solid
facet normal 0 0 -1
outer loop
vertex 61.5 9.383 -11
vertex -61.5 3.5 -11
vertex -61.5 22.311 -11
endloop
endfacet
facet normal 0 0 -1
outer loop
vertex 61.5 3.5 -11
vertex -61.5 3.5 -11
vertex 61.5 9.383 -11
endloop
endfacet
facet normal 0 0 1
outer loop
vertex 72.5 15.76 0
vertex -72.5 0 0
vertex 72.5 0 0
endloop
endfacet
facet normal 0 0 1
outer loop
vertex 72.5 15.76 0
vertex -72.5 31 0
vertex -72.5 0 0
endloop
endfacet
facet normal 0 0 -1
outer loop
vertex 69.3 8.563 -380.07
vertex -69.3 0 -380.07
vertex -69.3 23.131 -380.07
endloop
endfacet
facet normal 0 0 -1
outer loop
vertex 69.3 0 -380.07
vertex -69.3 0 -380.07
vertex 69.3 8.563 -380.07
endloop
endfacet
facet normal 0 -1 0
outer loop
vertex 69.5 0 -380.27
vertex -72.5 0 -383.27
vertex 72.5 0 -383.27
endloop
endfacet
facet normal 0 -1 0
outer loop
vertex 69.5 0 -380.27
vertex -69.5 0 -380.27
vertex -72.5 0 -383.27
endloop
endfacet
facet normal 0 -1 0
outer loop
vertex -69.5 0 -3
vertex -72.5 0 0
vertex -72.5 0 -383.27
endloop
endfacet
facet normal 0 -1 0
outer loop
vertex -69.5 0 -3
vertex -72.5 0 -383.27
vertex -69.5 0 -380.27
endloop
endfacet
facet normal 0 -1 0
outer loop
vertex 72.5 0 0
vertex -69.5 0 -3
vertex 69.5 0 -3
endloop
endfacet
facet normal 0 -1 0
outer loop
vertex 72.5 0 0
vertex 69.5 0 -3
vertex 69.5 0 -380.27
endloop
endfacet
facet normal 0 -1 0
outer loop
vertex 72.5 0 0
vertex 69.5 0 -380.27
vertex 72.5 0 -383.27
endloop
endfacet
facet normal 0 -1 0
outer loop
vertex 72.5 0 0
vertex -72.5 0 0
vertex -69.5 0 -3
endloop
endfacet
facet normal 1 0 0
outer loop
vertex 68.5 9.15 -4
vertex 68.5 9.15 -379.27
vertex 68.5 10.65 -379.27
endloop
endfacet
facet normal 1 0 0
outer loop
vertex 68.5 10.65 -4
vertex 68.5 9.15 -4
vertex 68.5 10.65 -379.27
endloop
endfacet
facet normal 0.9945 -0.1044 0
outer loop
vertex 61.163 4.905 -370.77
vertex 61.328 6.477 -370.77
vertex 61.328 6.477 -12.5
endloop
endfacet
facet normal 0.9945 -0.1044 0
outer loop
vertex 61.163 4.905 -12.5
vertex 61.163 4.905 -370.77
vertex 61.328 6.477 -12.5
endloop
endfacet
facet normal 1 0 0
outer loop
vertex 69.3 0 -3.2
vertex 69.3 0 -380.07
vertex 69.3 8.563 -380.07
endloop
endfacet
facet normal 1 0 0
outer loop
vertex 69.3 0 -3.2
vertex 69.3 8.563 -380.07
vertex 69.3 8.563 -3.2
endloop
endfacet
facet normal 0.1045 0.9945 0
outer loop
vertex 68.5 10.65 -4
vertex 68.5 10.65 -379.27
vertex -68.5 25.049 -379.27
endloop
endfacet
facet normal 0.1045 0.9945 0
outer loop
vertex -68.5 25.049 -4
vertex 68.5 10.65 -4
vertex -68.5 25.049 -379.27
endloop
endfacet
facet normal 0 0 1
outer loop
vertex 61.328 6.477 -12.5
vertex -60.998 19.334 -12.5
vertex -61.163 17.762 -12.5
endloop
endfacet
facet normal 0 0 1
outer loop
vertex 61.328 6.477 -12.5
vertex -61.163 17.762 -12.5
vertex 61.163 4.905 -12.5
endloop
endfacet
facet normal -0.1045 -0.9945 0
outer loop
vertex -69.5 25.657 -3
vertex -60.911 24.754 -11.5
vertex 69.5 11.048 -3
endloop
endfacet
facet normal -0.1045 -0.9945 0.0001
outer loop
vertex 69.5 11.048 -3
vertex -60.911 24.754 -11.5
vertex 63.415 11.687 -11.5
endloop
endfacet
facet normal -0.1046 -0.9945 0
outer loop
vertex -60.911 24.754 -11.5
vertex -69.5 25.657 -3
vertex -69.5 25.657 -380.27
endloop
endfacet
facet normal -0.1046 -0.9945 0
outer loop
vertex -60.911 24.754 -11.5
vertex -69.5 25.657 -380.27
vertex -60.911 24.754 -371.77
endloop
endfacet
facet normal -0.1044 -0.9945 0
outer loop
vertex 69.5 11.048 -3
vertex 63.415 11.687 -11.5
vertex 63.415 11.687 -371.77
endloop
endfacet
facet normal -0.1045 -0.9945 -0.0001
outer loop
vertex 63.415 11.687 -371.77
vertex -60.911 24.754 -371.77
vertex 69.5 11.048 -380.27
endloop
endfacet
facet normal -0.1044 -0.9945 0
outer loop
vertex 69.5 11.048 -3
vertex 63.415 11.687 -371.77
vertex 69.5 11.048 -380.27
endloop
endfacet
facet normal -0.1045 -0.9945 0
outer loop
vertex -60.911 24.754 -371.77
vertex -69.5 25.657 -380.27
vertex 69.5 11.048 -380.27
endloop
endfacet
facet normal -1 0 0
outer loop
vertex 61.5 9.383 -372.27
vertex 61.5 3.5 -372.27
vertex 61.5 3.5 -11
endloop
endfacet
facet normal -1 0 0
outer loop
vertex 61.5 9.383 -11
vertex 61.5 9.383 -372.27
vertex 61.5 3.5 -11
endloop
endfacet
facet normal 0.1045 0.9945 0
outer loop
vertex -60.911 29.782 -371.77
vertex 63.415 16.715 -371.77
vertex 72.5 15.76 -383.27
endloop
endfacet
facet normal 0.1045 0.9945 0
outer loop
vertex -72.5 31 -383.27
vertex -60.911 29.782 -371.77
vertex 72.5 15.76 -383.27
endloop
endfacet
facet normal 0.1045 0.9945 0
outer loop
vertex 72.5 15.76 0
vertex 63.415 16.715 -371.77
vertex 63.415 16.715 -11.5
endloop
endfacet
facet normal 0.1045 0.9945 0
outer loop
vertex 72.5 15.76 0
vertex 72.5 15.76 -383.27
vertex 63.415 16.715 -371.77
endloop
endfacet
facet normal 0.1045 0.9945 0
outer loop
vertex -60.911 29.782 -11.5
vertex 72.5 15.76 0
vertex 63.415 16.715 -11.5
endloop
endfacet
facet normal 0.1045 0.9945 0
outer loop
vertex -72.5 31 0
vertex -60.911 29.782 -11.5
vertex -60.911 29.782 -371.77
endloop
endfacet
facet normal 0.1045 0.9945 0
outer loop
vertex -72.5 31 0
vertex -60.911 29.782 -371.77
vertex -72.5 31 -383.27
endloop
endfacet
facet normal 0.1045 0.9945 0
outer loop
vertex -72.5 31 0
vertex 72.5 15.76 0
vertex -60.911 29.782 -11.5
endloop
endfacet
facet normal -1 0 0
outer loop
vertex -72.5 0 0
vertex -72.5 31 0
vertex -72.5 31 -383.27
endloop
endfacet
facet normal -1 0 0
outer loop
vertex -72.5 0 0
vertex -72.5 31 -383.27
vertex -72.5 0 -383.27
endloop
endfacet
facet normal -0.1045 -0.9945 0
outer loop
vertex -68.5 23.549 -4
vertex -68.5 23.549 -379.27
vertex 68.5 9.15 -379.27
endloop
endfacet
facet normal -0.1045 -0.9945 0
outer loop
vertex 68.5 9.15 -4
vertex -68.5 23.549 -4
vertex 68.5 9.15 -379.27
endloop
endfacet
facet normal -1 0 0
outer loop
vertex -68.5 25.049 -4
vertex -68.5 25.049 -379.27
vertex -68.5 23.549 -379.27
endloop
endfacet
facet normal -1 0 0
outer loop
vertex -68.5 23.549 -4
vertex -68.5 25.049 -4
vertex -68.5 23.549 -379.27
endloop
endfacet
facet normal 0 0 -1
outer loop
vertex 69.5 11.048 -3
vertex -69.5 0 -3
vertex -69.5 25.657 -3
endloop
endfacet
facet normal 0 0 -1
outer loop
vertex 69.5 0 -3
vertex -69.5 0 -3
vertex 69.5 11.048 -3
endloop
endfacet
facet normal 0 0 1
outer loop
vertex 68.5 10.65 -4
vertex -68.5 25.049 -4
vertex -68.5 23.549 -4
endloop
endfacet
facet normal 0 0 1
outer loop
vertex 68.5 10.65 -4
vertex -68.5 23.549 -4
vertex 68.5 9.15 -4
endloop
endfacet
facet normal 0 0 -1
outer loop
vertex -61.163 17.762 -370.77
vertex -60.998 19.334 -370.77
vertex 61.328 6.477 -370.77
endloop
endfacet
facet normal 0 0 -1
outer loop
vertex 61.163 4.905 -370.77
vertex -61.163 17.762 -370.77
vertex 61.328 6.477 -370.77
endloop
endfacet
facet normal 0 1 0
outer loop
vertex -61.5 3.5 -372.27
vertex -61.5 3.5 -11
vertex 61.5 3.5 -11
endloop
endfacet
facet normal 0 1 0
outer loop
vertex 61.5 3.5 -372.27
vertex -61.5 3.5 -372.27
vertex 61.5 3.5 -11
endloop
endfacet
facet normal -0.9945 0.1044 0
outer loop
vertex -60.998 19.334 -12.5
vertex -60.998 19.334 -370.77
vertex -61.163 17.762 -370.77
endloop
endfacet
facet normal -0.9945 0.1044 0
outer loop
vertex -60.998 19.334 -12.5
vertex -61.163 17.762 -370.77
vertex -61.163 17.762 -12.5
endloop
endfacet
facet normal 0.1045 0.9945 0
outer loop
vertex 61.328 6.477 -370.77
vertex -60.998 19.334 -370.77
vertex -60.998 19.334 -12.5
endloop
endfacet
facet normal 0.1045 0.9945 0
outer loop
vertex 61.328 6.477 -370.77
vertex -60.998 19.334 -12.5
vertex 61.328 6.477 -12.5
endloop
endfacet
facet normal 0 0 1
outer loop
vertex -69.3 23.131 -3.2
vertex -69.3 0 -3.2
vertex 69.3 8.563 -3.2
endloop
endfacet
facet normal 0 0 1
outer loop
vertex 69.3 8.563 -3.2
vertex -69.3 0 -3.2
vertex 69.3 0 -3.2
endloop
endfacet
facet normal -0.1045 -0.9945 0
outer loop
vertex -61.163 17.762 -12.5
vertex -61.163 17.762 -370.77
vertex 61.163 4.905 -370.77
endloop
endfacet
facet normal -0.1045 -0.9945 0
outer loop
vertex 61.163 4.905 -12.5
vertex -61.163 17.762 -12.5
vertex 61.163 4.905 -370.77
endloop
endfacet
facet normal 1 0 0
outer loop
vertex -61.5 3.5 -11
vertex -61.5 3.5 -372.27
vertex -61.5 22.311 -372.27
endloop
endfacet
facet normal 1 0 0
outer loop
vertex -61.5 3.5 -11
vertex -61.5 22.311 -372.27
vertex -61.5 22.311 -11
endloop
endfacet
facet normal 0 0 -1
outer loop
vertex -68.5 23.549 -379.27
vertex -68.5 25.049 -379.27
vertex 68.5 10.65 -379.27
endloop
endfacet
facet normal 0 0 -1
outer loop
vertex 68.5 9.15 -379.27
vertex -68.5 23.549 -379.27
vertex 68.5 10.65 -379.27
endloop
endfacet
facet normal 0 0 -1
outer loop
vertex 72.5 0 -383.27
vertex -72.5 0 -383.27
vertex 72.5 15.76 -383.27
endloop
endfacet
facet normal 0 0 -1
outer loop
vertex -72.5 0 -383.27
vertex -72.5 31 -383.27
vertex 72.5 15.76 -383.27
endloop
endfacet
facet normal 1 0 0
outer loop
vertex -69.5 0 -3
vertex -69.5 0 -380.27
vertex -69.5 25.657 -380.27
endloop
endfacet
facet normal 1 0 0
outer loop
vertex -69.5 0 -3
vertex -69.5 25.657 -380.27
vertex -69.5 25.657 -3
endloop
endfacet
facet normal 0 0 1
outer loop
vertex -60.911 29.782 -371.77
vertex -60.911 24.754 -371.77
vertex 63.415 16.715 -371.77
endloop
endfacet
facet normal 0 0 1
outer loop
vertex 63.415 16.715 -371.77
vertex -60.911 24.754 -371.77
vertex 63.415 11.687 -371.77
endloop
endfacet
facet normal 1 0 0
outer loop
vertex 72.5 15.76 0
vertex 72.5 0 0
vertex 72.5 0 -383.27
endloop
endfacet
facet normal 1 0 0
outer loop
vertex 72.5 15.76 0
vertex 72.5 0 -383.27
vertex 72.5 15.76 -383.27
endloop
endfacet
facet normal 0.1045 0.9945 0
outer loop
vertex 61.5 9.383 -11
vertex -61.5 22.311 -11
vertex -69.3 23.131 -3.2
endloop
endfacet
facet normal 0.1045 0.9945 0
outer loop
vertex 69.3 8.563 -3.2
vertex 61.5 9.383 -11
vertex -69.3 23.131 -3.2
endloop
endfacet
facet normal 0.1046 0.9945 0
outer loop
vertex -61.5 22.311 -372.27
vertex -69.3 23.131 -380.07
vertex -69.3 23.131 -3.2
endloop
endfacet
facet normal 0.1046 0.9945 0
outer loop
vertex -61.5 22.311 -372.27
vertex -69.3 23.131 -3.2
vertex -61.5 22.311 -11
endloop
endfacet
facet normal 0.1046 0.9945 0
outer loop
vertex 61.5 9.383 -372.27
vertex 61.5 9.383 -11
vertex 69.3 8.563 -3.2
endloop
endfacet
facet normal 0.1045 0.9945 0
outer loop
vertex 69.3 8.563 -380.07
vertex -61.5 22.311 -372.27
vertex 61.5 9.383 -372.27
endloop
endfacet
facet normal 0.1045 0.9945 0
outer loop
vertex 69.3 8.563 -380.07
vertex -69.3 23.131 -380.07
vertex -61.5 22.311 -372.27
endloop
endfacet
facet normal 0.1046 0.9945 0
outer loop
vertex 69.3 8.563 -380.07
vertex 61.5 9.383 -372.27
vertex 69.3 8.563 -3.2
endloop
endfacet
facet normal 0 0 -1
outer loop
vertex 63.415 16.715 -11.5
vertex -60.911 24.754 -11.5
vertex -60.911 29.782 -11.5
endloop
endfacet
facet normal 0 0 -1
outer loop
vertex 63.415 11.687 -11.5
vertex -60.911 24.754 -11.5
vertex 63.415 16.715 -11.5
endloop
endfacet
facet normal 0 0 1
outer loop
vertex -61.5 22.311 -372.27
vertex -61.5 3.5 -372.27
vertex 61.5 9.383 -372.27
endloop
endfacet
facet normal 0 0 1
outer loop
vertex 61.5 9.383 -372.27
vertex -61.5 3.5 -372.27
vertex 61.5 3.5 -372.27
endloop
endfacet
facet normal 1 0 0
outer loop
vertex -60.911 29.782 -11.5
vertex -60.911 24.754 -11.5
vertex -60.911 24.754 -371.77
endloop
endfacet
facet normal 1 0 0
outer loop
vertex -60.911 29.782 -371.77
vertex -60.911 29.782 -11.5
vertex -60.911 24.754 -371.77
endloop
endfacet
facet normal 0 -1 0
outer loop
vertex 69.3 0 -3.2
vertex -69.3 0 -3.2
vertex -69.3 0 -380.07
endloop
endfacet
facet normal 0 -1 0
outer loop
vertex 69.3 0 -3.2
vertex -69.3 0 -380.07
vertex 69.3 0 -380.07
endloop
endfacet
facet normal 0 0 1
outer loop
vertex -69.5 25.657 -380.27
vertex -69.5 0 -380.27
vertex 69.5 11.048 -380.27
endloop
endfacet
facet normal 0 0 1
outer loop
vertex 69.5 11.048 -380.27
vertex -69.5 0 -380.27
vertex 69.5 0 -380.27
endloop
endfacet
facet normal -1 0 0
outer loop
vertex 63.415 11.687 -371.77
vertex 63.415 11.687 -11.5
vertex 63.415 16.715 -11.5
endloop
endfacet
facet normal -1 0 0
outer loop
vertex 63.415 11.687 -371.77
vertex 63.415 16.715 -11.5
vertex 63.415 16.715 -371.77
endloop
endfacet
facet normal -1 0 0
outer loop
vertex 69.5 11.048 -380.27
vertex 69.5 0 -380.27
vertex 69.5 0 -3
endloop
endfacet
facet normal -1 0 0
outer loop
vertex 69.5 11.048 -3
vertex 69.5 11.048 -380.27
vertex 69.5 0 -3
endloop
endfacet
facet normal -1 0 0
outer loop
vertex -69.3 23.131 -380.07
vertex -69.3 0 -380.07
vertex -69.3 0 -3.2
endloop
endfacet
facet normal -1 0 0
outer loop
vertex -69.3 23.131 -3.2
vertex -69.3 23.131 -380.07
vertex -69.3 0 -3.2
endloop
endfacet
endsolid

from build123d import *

# Parameters (mm, degrees)
TOP_CASE_MAIN_DEPTH         = 383.27
TOP_CASE_CUT_REACH          = 393.297
SKETCH17_W                  = 139
SKETCH17_H                  = 377.27
TOP_PLATE_AND_RETENTION_W   = 124.32619313
TOP_PLATE_AND_RETENTION_H   = 360.27
TOP_CASE_CUT_EXTRUDE3_DEPTH = 392.278198101
PCB_SKETCH_W                = 123
PCB_SKETCH_H                = 358.27
PCB_MAIN_DEPTH              = 1.58
TOP_START                   = -379.27
TOP_PLATE_DEPTH             = 375.27
BASE_CASE_MAIN_REACH        = 393.297
SKETCH21_W                  = 138.6
SKETCH21_H                  = 376.87
CUT_EXTRUDE2_START          = -3.5
SKETCH24_W                  = 123
SKETCH24_H                  = 361.27
CUT_EXTRUDE2_DEPTH          = 388.796745323


# Read off the part's stored shape, not the designer's step: top plate
with BuildPart() as part:
    # side profile → top case main (new body)
    with BuildSketch(Plane.XY):
        Polygon((-72.5, 0), (72.5, 0), (72.5, 15.759885886), (-72.5, 31), align=None)
    extrude(amount=-TOP_CASE_MAIN_DEPTH)

    # top case cut: up to this plane
    top_case_cut_end = Plane(origin=(71.977357684, 10.78727641, -383.27), z_dir=(0.10452846326764624, 0.9945218953682741, 0))
    # Sketch17 → top case cut (cut, up to the surface)
    with BuildSketch(Plane.XZ, mode=Mode.PRIVATE) as top_case_cut_sk1:
        with Locations((0, -191.635)):
            Rectangle(SKETCH17_W, SKETCH17_H)
    top_case_cut_tool1 = split(extrude(top_case_cut_sk1.sketch, amount=-TOP_CASE_CUT_REACH, mode=Mode.PRIVATE), bisect_by=top_case_cut_end, keep=Keep.BOTH, mode=Mode.PRIVATE)
    add(top_case_cut_tool1.solids().sort_by_distance((0, 0, -191.635))[0], mode=Mode.SUBTRACT)

    # top plate and retention → top case Cut-Extrude3 (cut, through all)
    with BuildSketch(Plane(origin=(0.919925149, 2.5, 0), x_dir=(1, 0, 0), z_dir=(0, 1, 0))):
        with Locations((0.332325841, 191.635)):
            Rectangle(TOP_PLATE_AND_RETENTION_W, TOP_PLATE_AND_RETENTION_H)
    extrude(amount=TOP_CASE_CUT_EXTRUDE3_DEPTH, mode=Mode.SUBTRACT)


with BuildPart() as body_2:
    # pcb sketch → pcb main (new body)
    with BuildSketch(Plane(origin=(1.343385716, 12.781461307, 0), x_dir=(0.9945218953682741, -0.10452846326764635, 0), z_dir=(-0.10452846326764635, -0.9945218953682741, 0))):
        with Locations((-1.184720769, -191.635)):
            Rectangle(PCB_SKETCH_W, PCB_SKETCH_H)
    extrude(amount=PCB_MAIN_DEPTH)


with BuildPart() as body_3:
    # top plate outline → top plate (new body)
    with BuildSketch(Plane.XY.offset(TOP_START)):
        Polygon((68.5, 9.15000729), (68.5, 10.65000729), (-68.5, 25.049287521), (-68.5, 23.549287521), align=None)
    extrude(amount=TOP_PLATE_DEPTH)


with BuildPart() as body_4:
    # base case main: up to this plane
    base_case_main_end = Plane(origin=(1.803310955, 15.657357647, 0), z_dir=(0.10452846326764625, 0.9945218953682742, 0))
    # Sketch21 → base case main (new, up to the surface)
    with BuildSketch(Plane.XZ, mode=Mode.PRIVATE) as base_case_main_sk1:
        with Locations((0, -191.635)):
            Rectangle(SKETCH21_W, SKETCH21_H)
    base_case_main_tool1 = split(extrude(base_case_main_sk1.sketch, amount=-BASE_CASE_MAIN_REACH, mode=Mode.PRIVATE), bisect_by=base_case_main_end, keep=Keep.BOTH, mode=Mode.PRIVATE)
    add(base_case_main_tool1.solids().sort_by_distance((0, 0, -191.635))[0])

    # Sketch24 → Cut-Extrude2 (cut, through all)
    with BuildSketch(Plane.XZ.offset(CUT_EXTRUDE2_START)):
        with Locations((0, -191.635)):
            Rectangle(SKETCH24_W, SKETCH24_H)
    extrude(amount=-CUT_EXTRUDE2_DEPTH, mode=Mode.SUBTRACT)


solid = Compound([part.part, body_2.part, body_3.part, body_4.part])
